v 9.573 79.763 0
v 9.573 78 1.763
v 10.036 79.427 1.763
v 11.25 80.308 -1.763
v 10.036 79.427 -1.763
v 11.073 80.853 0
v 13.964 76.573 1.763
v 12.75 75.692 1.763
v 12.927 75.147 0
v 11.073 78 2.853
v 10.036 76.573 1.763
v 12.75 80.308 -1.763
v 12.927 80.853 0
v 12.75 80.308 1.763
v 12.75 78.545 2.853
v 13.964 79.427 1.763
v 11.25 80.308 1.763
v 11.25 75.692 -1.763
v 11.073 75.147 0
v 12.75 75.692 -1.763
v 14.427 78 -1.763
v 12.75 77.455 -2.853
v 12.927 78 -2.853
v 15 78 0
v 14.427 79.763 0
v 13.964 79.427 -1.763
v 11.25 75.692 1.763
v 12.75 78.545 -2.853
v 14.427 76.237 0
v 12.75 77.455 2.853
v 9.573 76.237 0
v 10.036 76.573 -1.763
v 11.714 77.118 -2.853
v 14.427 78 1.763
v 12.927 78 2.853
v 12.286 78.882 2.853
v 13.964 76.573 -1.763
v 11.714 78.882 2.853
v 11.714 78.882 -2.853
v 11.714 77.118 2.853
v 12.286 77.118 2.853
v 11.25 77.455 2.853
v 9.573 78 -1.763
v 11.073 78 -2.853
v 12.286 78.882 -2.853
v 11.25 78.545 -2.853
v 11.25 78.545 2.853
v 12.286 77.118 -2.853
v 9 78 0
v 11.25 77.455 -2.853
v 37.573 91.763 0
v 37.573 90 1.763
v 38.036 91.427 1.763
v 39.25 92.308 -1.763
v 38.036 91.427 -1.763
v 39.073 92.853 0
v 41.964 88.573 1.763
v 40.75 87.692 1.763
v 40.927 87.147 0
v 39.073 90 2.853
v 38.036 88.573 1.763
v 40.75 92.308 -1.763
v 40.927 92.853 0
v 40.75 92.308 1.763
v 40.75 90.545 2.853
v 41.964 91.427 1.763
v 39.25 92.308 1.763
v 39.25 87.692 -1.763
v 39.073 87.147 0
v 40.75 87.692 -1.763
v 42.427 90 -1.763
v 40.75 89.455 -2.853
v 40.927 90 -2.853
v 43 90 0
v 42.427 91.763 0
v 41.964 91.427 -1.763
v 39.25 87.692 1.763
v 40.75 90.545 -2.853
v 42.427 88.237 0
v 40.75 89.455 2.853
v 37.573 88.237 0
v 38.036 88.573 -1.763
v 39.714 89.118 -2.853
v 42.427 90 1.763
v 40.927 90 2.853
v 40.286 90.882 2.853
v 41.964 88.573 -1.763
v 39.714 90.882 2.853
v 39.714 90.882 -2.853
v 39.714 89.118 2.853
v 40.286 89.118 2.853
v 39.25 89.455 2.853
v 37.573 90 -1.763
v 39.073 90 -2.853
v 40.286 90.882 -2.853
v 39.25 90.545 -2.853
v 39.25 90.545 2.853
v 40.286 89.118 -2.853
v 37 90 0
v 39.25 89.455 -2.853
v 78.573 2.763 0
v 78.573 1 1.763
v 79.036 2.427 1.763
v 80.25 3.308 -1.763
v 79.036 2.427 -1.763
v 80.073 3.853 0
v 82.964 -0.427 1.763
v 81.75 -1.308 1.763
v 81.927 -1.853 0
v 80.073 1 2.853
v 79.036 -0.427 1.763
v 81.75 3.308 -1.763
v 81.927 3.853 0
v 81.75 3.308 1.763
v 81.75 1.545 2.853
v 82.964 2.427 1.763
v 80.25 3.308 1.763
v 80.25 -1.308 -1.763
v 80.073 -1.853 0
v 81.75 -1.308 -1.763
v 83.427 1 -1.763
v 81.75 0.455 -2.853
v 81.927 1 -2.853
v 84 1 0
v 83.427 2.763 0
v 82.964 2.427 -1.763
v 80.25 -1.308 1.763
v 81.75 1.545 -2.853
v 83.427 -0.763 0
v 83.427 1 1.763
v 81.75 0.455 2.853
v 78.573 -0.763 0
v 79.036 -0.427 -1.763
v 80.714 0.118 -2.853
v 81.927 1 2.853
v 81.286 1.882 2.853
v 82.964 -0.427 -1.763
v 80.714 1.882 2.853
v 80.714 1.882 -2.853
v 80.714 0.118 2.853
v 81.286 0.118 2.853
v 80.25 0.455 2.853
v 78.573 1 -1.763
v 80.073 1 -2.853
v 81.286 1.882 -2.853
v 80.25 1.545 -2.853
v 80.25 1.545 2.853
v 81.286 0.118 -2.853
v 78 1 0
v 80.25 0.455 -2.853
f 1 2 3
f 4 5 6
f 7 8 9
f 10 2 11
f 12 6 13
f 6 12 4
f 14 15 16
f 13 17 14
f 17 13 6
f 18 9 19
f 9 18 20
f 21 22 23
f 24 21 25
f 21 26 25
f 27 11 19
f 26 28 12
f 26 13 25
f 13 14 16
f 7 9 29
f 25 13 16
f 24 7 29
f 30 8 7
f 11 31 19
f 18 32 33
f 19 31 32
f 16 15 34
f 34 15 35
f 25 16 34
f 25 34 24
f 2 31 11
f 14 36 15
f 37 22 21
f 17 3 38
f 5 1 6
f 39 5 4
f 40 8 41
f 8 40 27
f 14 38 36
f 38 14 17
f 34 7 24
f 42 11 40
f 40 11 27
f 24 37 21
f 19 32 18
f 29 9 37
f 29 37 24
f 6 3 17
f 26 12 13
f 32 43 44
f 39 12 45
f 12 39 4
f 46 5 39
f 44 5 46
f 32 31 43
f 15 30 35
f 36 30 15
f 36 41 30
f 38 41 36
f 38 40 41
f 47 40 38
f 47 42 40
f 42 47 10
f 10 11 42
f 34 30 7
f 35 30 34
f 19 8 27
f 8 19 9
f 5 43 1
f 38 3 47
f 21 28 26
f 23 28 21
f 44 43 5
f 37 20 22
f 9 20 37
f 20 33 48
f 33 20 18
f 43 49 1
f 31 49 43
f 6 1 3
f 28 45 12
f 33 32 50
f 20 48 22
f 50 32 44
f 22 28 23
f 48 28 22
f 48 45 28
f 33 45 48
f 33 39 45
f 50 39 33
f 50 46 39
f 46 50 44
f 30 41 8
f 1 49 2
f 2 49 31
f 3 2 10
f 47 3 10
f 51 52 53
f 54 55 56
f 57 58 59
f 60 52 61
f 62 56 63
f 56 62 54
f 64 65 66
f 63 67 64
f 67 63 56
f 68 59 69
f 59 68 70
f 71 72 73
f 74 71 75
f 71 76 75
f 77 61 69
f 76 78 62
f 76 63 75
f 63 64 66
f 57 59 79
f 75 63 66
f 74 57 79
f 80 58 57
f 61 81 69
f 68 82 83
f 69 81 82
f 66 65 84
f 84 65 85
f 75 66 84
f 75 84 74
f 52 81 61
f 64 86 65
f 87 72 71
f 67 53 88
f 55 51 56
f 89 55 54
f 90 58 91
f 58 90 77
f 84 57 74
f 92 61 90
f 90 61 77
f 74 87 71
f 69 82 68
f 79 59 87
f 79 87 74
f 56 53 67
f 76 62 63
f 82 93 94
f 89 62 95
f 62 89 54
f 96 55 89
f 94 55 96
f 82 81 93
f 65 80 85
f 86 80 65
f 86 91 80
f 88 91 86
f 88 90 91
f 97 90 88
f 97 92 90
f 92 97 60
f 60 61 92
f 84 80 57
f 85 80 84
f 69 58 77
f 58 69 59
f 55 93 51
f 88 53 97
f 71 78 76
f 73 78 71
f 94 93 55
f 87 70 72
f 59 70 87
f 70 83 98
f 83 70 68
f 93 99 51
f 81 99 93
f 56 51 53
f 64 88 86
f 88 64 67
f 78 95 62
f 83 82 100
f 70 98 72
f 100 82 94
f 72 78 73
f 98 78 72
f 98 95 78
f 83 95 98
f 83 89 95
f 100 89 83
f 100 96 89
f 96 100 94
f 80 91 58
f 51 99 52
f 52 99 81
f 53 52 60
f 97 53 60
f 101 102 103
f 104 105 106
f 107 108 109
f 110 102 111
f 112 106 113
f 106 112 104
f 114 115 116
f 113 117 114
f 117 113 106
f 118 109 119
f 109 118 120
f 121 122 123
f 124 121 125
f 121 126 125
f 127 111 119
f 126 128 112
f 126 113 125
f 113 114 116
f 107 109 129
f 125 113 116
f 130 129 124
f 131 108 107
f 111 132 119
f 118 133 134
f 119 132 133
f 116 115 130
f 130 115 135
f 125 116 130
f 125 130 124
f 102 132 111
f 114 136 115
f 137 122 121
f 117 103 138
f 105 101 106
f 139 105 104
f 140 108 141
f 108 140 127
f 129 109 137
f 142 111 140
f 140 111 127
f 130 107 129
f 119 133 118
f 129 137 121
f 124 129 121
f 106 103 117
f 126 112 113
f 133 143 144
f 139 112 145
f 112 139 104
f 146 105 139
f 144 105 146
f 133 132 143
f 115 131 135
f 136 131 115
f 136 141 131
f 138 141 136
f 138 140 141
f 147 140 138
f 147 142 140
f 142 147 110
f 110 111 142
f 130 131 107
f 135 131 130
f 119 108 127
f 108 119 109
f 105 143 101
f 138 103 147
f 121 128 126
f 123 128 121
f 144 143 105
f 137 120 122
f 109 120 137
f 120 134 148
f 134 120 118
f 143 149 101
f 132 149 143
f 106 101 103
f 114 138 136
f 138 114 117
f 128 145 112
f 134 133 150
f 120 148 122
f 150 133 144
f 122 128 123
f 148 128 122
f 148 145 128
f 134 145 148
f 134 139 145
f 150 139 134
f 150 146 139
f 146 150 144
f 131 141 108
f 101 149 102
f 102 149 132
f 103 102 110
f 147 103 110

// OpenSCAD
// brute_force 
/*
find the nearest point
*/



//random points---------------------------------
function rnd_v(init_value,end_value)=round(rands(init_value,end_value,1)[0]);

init_value=0;
end_value=100;
points_num=3;

points=[
for(i=[0:points_num-1]
    )
    [rnd_v(init_value,end_value),
     rnd_v(init_value,end_value)
    ]];
for(i=points)
    translate(i)
        sphere(3);
//----------------------------------------------


function hypo(x,y)=
     pow(pow(x,2)+pow(y,2),0.5);


function find_min_distance(points)=
     let(init=0)
     let(index=1)
     let(leng=len(points)-1)
     leng==0? points[init]:
     let(p1=points[init])
     let(p2=points[index])
     let(min_distance=hypo(p1.x-p2.x,p1.y-p2.y))
     let(min_distance_points=[p1,p2])
    
     
     find_min_distance_inner(min_distance,   min_distance_points,init,index+1,leng);



function find_min_distance_inner(min_distance,min_distance_points,init,index,leng)=
     
     init>leng? min_distance_points:
     index>leng? 
     let(init_=init+1)
     let(index_=init_+1)
     find_min_distance_inner(min_distance,min_distance_points,init_,index_,leng):



     let(p1=points[init])
     let(p2=points[index])
     let(distance=hypo(p1.x-p2.x,p1.y-p2.y))
     min_distance>distance ?
     let(min_distance_points_=[p1,p2])
     let(min_distance_=distance)
     find_min_distance_inner(min_distance_,     min_distance_points_,init,index+1,leng):

     find_min_distance_inner(min_distance,min_distance_points,init,index+1,leng);     
     
        
    
two_points=find_min_distance(points);

echo(two_points);

for(i=two_points)
    translate(i)
        color("red")
           sphere(3);
